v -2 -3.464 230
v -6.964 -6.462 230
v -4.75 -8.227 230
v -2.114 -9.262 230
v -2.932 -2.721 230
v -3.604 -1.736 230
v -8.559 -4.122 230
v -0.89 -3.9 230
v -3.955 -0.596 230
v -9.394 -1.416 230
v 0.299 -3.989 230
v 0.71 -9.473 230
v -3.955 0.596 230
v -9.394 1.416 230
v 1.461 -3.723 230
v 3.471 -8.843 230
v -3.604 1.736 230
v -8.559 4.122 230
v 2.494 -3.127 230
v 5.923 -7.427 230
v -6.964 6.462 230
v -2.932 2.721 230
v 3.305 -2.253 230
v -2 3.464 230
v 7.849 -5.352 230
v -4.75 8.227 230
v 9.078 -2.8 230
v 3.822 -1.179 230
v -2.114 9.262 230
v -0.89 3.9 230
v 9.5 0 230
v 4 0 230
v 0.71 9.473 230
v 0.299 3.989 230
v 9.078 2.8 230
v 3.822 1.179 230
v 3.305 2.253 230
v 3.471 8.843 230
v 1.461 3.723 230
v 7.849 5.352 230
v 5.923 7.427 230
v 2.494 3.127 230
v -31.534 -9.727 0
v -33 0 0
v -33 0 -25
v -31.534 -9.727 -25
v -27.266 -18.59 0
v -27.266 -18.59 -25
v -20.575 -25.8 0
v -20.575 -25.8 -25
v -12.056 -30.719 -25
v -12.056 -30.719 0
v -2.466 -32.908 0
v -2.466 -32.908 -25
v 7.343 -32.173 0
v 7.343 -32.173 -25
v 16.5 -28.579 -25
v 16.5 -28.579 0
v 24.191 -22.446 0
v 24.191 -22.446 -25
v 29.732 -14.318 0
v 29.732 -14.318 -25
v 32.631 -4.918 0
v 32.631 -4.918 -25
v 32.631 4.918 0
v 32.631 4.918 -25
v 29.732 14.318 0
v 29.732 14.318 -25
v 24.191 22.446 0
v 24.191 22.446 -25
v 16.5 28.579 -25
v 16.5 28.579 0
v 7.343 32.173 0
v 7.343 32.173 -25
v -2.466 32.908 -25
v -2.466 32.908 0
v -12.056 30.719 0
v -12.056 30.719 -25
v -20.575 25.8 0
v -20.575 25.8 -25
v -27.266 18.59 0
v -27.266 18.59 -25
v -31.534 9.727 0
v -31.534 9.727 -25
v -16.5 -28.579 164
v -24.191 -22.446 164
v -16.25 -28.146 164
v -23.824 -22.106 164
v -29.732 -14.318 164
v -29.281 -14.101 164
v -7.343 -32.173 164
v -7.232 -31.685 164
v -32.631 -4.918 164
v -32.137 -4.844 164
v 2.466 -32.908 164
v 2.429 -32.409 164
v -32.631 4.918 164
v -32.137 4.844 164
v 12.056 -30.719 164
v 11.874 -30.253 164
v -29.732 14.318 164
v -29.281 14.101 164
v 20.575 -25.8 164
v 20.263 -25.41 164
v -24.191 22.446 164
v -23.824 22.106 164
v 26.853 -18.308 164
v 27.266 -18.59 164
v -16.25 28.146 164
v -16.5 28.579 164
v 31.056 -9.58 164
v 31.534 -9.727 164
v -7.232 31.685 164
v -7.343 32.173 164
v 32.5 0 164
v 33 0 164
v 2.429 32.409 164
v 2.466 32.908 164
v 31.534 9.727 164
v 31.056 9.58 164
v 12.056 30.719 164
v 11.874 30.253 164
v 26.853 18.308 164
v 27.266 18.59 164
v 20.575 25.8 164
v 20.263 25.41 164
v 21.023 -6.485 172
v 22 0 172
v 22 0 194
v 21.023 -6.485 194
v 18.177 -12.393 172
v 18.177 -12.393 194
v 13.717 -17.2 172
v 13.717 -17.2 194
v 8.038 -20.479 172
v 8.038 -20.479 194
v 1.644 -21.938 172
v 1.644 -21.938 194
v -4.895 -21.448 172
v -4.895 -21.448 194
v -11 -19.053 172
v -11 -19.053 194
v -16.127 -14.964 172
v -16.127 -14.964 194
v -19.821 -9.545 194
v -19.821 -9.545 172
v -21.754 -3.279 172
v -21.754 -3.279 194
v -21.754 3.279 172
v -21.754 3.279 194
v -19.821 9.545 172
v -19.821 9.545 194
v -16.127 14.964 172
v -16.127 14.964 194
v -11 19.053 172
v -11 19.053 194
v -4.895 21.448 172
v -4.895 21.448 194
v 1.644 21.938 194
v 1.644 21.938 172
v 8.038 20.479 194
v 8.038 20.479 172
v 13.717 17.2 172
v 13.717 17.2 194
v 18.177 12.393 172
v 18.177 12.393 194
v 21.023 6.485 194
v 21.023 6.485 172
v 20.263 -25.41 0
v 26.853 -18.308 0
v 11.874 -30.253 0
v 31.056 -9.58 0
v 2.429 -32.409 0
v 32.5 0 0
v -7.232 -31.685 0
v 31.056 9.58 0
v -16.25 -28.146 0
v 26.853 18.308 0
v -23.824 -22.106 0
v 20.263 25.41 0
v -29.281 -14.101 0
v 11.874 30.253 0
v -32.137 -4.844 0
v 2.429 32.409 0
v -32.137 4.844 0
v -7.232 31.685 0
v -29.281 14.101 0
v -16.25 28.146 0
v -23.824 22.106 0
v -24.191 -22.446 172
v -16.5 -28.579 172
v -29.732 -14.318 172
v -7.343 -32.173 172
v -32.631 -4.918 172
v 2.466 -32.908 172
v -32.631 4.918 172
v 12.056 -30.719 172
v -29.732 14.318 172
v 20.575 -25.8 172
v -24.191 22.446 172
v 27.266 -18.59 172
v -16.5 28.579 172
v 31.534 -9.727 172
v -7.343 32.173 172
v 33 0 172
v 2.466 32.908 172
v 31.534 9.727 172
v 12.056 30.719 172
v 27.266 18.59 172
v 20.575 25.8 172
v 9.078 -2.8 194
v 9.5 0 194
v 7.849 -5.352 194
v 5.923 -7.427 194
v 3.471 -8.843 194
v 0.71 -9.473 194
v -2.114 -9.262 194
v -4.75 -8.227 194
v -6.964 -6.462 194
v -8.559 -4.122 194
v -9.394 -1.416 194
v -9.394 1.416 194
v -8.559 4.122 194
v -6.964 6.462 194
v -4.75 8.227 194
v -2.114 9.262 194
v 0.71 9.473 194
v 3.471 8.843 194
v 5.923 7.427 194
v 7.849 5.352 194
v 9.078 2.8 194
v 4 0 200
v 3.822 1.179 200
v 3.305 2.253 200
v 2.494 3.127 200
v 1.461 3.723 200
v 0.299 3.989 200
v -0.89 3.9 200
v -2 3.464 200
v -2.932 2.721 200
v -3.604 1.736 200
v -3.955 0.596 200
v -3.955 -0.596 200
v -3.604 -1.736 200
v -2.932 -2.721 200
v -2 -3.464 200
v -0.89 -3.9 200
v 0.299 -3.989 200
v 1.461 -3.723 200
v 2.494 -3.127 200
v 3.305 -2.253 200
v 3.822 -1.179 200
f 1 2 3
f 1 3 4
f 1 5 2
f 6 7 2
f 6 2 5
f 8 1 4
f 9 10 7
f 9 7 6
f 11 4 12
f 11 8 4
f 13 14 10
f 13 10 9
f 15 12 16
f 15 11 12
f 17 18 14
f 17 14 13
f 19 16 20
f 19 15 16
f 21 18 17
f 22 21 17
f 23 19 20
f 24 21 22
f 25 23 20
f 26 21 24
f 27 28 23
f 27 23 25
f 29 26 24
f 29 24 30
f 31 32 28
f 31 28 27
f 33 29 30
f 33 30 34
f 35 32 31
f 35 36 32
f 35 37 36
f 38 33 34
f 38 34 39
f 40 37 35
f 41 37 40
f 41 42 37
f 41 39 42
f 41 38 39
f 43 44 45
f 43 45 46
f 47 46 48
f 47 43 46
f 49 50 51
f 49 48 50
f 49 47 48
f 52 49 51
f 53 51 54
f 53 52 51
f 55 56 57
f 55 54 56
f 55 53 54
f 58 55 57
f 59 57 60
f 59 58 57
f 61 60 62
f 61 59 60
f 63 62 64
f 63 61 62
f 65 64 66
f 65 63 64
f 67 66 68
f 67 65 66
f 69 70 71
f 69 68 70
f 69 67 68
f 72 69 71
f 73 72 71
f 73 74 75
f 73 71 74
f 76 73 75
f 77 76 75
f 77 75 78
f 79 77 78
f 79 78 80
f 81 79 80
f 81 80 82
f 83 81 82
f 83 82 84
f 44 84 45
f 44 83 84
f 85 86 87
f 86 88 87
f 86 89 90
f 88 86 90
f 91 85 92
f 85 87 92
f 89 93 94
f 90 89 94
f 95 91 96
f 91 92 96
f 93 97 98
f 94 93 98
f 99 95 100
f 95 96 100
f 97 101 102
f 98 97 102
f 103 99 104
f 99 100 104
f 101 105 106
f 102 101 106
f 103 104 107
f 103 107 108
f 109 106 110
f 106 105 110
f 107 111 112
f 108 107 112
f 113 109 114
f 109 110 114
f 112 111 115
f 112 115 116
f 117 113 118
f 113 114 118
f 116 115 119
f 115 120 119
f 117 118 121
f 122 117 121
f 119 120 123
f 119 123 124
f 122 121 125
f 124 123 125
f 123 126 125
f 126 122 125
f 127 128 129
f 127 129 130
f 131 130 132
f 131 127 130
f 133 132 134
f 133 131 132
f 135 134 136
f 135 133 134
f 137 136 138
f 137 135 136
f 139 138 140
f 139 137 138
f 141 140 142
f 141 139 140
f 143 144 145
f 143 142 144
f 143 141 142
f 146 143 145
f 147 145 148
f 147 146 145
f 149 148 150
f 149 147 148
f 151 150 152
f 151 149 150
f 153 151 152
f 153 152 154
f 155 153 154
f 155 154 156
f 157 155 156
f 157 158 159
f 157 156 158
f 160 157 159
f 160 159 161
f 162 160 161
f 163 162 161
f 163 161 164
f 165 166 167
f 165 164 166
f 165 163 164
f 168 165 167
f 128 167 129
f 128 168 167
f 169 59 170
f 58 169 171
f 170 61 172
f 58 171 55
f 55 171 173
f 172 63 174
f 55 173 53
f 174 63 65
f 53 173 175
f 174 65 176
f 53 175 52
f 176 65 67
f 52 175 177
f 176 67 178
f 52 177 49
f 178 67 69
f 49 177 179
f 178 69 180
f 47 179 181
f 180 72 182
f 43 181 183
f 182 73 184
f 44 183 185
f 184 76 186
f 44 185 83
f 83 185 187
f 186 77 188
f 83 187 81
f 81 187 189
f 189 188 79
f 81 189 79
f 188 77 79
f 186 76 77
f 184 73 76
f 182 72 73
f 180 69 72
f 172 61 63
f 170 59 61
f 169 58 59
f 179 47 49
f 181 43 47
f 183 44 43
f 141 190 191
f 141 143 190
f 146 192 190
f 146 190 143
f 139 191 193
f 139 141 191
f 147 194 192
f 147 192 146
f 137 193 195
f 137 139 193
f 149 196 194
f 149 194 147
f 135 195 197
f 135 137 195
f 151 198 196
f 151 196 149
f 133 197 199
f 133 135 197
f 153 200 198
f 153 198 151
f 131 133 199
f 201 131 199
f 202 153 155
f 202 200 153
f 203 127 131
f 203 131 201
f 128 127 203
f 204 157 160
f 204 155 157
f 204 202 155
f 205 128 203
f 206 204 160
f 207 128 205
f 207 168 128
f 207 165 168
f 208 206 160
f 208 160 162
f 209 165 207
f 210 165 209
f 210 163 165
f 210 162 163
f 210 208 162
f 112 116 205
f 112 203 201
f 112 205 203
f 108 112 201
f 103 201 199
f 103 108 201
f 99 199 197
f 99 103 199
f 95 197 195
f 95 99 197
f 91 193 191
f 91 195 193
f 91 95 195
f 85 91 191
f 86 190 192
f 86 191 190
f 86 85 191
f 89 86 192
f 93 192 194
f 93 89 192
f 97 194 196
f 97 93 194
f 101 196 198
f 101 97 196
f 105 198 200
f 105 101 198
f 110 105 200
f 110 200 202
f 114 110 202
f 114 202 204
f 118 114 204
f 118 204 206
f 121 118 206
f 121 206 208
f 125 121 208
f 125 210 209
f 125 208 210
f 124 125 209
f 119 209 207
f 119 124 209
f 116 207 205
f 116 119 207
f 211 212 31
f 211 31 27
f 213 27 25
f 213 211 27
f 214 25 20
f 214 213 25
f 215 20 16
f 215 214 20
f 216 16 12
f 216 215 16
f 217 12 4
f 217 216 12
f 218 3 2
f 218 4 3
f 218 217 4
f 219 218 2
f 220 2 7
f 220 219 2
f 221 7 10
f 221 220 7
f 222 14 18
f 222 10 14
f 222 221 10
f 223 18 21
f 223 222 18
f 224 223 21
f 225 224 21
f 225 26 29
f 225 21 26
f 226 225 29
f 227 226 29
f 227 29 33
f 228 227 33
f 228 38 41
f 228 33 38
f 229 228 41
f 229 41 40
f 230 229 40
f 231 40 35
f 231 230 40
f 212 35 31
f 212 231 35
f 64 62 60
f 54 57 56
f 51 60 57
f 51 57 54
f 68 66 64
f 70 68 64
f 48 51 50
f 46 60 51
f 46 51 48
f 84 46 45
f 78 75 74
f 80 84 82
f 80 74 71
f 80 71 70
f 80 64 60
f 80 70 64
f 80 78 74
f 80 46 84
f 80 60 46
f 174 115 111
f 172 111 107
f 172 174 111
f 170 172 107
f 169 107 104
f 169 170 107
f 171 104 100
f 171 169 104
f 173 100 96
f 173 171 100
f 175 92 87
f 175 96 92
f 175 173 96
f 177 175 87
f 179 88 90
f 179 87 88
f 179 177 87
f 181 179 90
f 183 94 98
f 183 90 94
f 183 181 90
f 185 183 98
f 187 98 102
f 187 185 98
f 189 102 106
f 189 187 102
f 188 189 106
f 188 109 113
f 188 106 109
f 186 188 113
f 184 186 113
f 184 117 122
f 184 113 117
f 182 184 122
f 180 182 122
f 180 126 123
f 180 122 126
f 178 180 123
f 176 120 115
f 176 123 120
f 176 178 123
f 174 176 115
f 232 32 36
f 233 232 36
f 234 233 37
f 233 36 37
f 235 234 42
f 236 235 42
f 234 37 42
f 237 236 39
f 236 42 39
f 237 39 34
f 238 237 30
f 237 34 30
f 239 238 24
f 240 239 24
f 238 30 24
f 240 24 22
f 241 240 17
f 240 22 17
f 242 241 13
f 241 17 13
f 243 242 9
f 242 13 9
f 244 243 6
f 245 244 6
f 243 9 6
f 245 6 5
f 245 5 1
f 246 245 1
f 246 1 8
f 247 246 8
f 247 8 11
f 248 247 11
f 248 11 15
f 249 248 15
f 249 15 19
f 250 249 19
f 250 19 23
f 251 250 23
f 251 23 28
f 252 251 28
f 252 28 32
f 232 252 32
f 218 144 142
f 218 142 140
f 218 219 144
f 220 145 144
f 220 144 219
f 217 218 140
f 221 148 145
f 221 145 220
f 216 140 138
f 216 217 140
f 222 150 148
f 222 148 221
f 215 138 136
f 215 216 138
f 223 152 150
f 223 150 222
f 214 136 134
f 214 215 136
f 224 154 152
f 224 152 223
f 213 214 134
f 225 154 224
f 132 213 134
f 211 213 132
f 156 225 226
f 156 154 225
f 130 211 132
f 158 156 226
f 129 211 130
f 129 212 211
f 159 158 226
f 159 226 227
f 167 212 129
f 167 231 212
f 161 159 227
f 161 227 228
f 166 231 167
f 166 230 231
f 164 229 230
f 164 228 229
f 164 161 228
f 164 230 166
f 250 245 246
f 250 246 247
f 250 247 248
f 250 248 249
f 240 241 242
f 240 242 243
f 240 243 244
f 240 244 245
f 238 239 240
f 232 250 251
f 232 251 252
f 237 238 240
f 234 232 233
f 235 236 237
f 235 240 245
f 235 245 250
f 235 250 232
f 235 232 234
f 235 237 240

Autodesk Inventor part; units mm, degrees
ref_plane "YZ Plane" through (0, 0, 0) normal (1, 0, 0) x (0, 1, 0)
ref_plane "XZ Plane" through (0, 0, 0) normal (0, 1, 0) x (-1, 0, 0)
ref_plane "XY Plane" through (0, 0, 0) normal (0, 0, 1) x (1, 0, 0)
sketch "Szkic1" plane through (0, 0, 0) normal (0, 0, 1) x (1, 0, 0)
  circle A0 centre (0, 0) radius 32.5
  dimension "d0" = 65
extrude "Wyciągnięcie proste1" add sketch "Szkic1" along normal blind 164
sketch "Szkic2" plane through (0, 0, 0) normal (0, 0, -1) x (-1, 0, 0)
  circle A0 centre (0, 0) radius 32.5 projected
  circle A1 centre (0, 0) radius 33
  dimension "d3" = 66
extrude "Wyciągnięcie proste2" add sketch "Szkic2" along normal blind 25 contours A0 | A1
sketch "Szkic3" plane through (0, 0, 164) normal (0, 0, 1) x (1, 0, 0)
  circle A0 centre (0, 0) radius 33
  dimension "d6" = 66
extrude "Wyciągnięcie proste3" add sketch "Szkic3" along normal blind 8
sketch "Szkic4" plane through (0, 0, 172) normal (0, 0, 1) x (1, 0, 0)
  circle A0 centre (0, 0) radius 22
  dimension "d9" = 44
extrude "Wyciągnięcie proste4" add sketch "Szkic4" along normal blind 22
sketch "Szkic5" plane through (0, 0, 194) normal (0, 0, 1) x (1, 0, 0)
  circle A0 centre (0, 0) radius 9.5
  dimension "d12" = 19
extrude "Wyciągnięcie proste5" add sketch "Szkic5" along normal blind 36
sketch "Szkic6" plane through (0, 0, 230) normal (0, 0, 1) x (1, 0, 0)
  circle A0 centre (0, 0) radius 4
  dimension "d15" = 8
extrude "Wyciągnięcie proste6" cut sketch "Szkic6" against normal blind 30
properties part number "Wrzeciono Elektrowrzeciono CNC 0.8kw"
